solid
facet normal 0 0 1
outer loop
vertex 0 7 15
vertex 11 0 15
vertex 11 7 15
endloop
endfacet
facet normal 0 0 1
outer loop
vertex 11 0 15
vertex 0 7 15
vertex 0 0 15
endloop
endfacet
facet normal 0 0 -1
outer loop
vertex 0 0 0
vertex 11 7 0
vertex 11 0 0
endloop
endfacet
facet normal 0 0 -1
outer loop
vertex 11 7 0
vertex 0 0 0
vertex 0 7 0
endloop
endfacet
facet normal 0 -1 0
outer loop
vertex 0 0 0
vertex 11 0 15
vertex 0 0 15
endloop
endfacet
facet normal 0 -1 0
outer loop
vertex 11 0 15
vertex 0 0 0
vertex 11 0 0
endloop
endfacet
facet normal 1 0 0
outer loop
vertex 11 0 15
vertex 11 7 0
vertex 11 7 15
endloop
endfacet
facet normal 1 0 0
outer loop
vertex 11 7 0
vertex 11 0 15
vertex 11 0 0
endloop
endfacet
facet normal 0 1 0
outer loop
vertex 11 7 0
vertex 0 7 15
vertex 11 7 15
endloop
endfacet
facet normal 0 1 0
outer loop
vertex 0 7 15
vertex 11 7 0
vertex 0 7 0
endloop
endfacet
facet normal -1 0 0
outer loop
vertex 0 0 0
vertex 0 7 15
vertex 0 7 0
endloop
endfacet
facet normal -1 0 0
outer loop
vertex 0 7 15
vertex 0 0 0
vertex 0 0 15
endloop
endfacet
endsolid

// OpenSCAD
// Generated by SolidPython 1.0.1 on 2020-07-29 00:46:55


cube(size = [11, 7, 15]);
/***********************************************
*********      SolidPython code:      **********
************************************************
 
# import packages: SolidPython
from solid import *
from solid.utils import *
from itertools import chain, combinations, permutations


class Resize:

    def __init__(self, scad_file):
        self.scad_file = scad_file
        #self.scad_file = import_scad(scad_file)
        # cone/cylinder param:
        self.r1 = 0
        self.r2 = 0
        self.h = 0
        # rectangular prism param:
        self.w = 0
        self.l = 0
        # ellipse param:
        self.r = 0

    # import OpenScad code (file name corresponds to shape)


    # classify shape + parameters
    def assign(self, param1, param2, param3):
        if self.scad_file == 'cone.scad':
            self.r1 = param1
            self.r2 = param2
            self.h = param3
        elif self.scad_file == 'cylinder.scad':
            self.r1 = param1
            self.r2 = param2
            self.h = param3
        elif self.scad_file == 'rectangularPrism.scad':
            self.h = param1
            self.l = param2
            self.w = param3
        else:
            self.r = param1
            self.h = param2

    # resize parameters
    def iterate(self):
        x = range(3, 20, 2)
        i = 1
        if self.scad_file == 'cone.scad':
            tempList = list(permutations(x, 2))
            for temp in tempList:
                param1 = temp[0]
                param2 = temp[1]
                filepath = 'produced_scad_files/' + 'cone' + str(param1) + '_' + str(param2) + '_' + '.scad'
                scad_render_to_file(cylinder(h=param1, r1=param2, r2=0), filepath)

        elif self.scad_file == 'cylinder.scad':
            tempList = list(permutations(x, 3))
            for temp in tempList:
                param1 = temp[0]
                param2 = temp[1]
                filepath = 'produced_scad_files/' + 'cylinder' + str(param1) + '_' + str(param2) + '_' + '.scad'
                scad_render_to_file(cylinder(h=param1, r1=param2, r2=param2), filepath)

        elif self.scad_file == 'rectangularPrism.scad':
            tempList = list(permutations(x, 3))
            for temp in tempList:
                param1 = temp[0]
                param2 = temp[1]
                param3 = temp[2]
                filepath = 'produced_scad_files/' + 'rectangularPrism' + str(param1) + '_' + str(param2) + '_' + str(
                    param3) + '.scad'
                scad_render_to_file(cube(size=(param1, param2, param3)), filepath)

        elif self.scad_file == 'ellipse.scad':
            tempList = list(permutations(x, 4))
            for temp in tempList:
                param1 = temp[0]
                param2 = temp[1]
                param3 = temp[2]
                param4 = temp[3]
                filepath = 'produced_scad_files/' + 'ellipse' + str(param1) + '_' + str(param2) + '_' + str(param3) + '_' + str(param4) + '.scad'
                scad_render_to_file(scale([param1, param2, param3])(sphere(r=param4)), filepath)

    def render_to_scadfile(self):
        scad_render_to_file(scad, 'example.scad') 
 
************************************************/
